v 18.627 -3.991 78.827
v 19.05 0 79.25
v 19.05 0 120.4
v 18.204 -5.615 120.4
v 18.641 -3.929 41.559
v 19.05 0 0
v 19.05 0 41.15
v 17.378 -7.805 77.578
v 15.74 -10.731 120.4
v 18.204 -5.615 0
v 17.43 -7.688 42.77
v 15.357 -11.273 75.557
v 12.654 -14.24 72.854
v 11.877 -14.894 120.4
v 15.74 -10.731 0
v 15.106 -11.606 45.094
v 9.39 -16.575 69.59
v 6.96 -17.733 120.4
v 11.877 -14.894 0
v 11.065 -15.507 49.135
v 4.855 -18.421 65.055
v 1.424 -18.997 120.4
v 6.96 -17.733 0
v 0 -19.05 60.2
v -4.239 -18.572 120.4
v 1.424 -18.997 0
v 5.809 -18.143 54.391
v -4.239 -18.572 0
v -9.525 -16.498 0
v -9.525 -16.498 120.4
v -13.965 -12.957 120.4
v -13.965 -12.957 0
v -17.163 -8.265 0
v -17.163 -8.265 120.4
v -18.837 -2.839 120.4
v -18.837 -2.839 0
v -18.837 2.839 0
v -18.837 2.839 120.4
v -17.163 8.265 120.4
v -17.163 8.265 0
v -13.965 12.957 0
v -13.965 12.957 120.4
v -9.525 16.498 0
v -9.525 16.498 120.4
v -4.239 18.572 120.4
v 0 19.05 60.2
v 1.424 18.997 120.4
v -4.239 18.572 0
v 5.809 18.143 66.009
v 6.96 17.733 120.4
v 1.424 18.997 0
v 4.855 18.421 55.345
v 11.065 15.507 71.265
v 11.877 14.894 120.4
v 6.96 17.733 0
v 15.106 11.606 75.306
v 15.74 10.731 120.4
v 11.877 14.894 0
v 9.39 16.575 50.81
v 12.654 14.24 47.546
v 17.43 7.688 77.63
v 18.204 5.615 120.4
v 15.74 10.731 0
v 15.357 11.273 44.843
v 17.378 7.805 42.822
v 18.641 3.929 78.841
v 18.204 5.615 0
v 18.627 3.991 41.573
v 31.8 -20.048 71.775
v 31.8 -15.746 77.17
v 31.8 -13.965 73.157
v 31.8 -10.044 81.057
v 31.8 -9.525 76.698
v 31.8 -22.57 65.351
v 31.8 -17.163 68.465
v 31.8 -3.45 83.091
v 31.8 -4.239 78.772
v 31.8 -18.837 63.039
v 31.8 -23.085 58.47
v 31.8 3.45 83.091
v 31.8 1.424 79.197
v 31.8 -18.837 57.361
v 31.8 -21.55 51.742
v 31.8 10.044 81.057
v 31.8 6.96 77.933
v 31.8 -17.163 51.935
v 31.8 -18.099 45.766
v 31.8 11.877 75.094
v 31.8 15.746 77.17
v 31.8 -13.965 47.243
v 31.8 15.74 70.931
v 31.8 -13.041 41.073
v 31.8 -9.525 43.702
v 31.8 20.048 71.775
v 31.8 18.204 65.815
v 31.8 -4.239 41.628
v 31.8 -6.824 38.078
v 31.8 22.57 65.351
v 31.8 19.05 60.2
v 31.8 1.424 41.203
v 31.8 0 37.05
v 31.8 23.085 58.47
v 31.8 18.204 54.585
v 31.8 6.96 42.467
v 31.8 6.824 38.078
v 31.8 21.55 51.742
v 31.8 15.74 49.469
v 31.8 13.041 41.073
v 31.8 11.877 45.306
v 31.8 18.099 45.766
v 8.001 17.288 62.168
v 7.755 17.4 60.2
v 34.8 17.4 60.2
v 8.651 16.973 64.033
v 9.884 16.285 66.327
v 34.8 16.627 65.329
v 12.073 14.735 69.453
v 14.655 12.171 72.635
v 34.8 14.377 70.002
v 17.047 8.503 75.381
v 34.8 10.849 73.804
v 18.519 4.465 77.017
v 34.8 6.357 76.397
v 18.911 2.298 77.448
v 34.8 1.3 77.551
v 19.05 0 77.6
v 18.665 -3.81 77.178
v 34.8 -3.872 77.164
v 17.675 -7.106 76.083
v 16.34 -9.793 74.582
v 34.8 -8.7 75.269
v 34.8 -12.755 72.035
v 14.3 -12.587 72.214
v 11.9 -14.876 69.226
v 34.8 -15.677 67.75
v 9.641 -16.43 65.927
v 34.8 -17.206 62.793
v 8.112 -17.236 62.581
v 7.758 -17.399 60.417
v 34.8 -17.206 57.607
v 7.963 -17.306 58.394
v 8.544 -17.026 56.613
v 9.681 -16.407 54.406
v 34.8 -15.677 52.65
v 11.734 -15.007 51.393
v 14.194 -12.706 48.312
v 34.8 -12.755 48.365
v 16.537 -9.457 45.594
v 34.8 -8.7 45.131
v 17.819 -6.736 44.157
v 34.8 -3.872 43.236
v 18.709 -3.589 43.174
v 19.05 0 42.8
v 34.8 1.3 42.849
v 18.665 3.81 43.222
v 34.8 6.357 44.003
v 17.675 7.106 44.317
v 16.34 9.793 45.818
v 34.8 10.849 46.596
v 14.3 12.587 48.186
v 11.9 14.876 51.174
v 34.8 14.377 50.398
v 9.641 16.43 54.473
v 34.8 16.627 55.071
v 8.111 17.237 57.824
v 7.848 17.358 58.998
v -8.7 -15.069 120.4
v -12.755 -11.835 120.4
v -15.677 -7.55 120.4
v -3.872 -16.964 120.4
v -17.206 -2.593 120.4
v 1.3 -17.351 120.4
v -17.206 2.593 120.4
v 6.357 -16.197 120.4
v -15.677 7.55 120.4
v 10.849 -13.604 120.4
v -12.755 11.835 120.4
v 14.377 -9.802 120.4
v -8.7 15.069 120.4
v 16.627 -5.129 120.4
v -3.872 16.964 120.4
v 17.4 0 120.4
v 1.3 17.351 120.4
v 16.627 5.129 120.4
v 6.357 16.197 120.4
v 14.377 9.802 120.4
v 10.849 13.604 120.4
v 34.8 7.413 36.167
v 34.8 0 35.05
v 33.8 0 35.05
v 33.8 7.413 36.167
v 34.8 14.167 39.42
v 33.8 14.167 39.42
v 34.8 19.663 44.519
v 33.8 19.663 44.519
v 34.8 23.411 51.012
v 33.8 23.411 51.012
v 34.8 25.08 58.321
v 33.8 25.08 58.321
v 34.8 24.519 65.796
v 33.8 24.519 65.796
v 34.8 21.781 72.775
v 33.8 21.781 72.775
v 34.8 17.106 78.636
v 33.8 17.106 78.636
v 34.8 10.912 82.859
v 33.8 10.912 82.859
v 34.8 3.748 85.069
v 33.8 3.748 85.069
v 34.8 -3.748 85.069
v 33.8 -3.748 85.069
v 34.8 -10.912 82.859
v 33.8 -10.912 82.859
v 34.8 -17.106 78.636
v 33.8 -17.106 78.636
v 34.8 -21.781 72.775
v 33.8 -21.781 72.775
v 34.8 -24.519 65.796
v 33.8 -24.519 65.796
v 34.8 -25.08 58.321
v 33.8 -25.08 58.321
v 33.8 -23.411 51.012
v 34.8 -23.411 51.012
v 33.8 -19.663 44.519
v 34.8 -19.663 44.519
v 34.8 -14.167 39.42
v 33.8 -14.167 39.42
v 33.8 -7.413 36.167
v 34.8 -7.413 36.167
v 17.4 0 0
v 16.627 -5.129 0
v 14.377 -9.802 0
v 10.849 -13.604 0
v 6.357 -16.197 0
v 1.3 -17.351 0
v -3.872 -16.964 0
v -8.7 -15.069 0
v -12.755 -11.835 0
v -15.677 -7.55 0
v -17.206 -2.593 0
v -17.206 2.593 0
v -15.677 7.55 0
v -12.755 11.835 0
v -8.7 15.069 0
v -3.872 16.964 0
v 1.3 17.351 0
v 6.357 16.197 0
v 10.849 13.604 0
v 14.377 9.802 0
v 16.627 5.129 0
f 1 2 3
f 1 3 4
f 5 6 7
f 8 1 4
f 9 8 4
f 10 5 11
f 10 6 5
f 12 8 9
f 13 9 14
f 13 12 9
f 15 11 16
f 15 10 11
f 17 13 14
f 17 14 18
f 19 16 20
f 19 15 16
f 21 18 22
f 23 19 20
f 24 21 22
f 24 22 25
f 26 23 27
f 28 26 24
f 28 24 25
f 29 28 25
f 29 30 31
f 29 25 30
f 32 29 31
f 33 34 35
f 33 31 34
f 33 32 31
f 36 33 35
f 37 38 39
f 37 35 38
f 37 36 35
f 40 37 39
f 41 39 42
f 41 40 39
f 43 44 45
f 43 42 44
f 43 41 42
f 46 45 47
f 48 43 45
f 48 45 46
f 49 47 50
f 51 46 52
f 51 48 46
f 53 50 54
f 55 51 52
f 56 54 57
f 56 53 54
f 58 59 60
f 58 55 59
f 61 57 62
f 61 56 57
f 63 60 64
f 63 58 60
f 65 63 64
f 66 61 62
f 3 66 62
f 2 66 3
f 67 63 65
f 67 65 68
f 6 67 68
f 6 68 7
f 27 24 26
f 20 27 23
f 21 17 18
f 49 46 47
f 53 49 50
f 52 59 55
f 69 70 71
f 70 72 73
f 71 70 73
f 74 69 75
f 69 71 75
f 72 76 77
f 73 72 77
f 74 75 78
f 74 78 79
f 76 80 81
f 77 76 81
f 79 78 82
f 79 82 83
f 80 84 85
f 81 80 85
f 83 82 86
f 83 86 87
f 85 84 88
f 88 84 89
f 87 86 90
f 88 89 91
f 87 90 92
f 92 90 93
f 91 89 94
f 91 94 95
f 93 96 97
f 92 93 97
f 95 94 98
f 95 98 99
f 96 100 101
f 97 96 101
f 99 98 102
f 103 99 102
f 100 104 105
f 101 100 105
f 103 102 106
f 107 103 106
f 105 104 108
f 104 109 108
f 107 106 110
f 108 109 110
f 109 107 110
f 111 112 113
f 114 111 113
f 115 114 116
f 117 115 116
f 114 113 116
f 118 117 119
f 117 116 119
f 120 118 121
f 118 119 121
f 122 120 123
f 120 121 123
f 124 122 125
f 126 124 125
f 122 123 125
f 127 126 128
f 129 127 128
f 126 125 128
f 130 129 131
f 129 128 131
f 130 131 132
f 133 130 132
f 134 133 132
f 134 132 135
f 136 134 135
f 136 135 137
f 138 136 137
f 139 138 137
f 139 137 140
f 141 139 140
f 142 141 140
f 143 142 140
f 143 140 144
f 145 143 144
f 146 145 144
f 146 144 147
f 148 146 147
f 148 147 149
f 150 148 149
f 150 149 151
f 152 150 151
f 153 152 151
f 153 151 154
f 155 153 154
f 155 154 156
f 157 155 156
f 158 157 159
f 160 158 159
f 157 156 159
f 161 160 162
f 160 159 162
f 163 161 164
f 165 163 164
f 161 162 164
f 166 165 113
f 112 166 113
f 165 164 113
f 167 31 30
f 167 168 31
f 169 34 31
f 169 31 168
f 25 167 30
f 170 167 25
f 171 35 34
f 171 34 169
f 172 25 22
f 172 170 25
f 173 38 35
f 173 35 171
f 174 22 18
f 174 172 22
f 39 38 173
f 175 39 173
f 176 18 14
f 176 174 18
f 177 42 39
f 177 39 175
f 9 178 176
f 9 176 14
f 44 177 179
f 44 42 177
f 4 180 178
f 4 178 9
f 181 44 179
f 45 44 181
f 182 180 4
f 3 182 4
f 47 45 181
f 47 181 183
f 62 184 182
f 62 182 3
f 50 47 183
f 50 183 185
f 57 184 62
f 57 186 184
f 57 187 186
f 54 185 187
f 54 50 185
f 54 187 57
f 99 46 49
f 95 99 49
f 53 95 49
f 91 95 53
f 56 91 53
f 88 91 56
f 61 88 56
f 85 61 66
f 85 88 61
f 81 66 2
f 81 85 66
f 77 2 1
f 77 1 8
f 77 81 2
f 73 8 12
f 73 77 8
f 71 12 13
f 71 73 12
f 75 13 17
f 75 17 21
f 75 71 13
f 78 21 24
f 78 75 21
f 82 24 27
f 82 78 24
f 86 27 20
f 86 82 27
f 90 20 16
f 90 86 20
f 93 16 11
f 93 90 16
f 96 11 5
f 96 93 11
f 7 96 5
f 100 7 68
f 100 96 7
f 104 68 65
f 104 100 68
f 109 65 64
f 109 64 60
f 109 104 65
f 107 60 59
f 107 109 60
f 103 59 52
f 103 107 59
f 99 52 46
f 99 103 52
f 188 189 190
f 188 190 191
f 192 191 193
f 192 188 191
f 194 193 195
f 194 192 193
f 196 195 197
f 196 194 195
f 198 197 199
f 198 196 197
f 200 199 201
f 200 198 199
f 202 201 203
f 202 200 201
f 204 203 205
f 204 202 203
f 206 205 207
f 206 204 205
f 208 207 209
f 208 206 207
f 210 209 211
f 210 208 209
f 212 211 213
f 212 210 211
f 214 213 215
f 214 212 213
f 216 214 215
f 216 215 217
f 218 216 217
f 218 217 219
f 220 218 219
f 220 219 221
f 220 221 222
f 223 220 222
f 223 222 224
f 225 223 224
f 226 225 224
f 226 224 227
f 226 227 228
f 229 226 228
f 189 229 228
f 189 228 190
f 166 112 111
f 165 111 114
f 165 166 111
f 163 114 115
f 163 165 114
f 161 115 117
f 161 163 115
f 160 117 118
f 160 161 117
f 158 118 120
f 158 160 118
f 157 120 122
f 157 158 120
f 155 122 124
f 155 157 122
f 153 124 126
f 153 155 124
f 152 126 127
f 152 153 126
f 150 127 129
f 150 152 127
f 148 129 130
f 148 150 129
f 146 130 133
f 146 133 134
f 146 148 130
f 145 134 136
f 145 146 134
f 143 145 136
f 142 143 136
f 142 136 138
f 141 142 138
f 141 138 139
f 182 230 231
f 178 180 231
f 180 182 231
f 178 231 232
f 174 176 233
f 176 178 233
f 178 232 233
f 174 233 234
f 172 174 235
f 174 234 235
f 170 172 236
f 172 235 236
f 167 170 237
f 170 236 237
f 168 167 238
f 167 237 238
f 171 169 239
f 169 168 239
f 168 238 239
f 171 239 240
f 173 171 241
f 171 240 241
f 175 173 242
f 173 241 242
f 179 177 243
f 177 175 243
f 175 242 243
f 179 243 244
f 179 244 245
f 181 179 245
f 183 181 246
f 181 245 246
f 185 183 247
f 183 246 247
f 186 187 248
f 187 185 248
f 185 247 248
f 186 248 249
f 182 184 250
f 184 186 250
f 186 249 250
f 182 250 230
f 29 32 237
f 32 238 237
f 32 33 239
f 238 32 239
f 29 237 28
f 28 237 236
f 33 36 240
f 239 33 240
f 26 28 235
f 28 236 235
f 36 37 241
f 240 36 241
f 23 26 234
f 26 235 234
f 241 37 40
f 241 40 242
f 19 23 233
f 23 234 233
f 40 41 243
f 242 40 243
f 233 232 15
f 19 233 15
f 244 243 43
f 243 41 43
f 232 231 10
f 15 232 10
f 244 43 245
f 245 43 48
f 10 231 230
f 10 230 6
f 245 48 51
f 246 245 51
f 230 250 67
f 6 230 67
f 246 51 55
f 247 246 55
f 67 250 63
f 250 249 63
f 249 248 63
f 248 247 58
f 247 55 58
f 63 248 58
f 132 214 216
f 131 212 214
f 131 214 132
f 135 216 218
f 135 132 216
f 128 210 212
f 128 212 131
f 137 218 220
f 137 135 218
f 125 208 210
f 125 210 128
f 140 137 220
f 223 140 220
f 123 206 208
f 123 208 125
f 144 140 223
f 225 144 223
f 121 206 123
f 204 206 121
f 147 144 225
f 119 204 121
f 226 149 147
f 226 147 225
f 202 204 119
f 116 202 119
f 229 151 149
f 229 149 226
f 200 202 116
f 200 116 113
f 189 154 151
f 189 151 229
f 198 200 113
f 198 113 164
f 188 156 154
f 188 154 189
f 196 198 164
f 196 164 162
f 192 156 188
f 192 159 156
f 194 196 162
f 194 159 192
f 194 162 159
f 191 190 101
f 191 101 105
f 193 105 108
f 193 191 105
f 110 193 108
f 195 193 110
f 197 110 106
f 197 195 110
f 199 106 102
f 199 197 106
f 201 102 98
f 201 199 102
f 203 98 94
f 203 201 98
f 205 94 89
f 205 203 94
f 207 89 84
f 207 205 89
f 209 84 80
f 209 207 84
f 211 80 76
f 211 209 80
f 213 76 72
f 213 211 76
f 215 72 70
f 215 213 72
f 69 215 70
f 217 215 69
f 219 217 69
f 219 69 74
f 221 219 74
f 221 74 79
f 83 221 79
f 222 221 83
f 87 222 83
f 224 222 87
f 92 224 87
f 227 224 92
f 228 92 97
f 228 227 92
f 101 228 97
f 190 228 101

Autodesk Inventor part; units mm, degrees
ref_plane "YZ Plane" through (0, 0, 0) normal (1, 0, 0) x (0, 1, 0)
ref_plane "XZ Plane" through (0, 0, 0) normal (0, 1, 0) x (-1, 0, 0)
sketch "Sketch1" plane through (0, 0, 0) normal (0, 0, 1) x (1, 0, 0)
  circle A0 centre (0, 0) radius 19.05
  circle A1 centre (0, 0) radius 17.4
  dimension "d0" = 38.1
  dimension "d3" = 1.65
extrude "Extrusion1" add sketch "Sketch1" along normal blind 120.4
ref_plane "Work Plane1" through (34.8, 0, 0) normal (1, 0, 0) x (0, 1, 0)
sketch "Sketch2" plane through (34.8, 0, 0) normal (1, 0, 0) x (0, 1, 0)
  line L0 (-19.05, 120.4) -> (19.05, 120.4) projected
  line L1 (-19.05, 0) -> (19.05, 0) projected
  line L2 (19.05, 0) -> (19.05, 120.4) projected
  line L3 (-19.05, 0) -> (-19.05, 120.4) projected
  line L4 (0, 120.4) -> (0, 0) construction
  circle A0 centre (0, 60.2) radius 19.05
  circle A1 centre (0, 60.2) radius 17.4
  dimension "d7" = 38.1
  dimension "d8" = 1.65
extrude "Extrusion2" add sketch "Sketch2" against normal up to next contours A0
sketch "Sketch6" plane through (34.8, 0, 60.2) normal (1, 0, 0) x (0, 0, -1)
  circle A0 centre (0, 0) radius 17.4 projected
  circle A1 centre (0, 0) radius 19.05 projected
  circle A2 centre (0, 0) radius 25.15
  dimension "d17" = 0
  dimension "d18" = 50.3
extrude "Extrusion4" add sketch "Sketch6" against normal blind 3 contours A2
chamfer "Chamfer2" distance 2 angle 45 1 edges at (31.8, 0, 85.35)
properties part number "ASME BPE Eq Inst Tee-38.1"
